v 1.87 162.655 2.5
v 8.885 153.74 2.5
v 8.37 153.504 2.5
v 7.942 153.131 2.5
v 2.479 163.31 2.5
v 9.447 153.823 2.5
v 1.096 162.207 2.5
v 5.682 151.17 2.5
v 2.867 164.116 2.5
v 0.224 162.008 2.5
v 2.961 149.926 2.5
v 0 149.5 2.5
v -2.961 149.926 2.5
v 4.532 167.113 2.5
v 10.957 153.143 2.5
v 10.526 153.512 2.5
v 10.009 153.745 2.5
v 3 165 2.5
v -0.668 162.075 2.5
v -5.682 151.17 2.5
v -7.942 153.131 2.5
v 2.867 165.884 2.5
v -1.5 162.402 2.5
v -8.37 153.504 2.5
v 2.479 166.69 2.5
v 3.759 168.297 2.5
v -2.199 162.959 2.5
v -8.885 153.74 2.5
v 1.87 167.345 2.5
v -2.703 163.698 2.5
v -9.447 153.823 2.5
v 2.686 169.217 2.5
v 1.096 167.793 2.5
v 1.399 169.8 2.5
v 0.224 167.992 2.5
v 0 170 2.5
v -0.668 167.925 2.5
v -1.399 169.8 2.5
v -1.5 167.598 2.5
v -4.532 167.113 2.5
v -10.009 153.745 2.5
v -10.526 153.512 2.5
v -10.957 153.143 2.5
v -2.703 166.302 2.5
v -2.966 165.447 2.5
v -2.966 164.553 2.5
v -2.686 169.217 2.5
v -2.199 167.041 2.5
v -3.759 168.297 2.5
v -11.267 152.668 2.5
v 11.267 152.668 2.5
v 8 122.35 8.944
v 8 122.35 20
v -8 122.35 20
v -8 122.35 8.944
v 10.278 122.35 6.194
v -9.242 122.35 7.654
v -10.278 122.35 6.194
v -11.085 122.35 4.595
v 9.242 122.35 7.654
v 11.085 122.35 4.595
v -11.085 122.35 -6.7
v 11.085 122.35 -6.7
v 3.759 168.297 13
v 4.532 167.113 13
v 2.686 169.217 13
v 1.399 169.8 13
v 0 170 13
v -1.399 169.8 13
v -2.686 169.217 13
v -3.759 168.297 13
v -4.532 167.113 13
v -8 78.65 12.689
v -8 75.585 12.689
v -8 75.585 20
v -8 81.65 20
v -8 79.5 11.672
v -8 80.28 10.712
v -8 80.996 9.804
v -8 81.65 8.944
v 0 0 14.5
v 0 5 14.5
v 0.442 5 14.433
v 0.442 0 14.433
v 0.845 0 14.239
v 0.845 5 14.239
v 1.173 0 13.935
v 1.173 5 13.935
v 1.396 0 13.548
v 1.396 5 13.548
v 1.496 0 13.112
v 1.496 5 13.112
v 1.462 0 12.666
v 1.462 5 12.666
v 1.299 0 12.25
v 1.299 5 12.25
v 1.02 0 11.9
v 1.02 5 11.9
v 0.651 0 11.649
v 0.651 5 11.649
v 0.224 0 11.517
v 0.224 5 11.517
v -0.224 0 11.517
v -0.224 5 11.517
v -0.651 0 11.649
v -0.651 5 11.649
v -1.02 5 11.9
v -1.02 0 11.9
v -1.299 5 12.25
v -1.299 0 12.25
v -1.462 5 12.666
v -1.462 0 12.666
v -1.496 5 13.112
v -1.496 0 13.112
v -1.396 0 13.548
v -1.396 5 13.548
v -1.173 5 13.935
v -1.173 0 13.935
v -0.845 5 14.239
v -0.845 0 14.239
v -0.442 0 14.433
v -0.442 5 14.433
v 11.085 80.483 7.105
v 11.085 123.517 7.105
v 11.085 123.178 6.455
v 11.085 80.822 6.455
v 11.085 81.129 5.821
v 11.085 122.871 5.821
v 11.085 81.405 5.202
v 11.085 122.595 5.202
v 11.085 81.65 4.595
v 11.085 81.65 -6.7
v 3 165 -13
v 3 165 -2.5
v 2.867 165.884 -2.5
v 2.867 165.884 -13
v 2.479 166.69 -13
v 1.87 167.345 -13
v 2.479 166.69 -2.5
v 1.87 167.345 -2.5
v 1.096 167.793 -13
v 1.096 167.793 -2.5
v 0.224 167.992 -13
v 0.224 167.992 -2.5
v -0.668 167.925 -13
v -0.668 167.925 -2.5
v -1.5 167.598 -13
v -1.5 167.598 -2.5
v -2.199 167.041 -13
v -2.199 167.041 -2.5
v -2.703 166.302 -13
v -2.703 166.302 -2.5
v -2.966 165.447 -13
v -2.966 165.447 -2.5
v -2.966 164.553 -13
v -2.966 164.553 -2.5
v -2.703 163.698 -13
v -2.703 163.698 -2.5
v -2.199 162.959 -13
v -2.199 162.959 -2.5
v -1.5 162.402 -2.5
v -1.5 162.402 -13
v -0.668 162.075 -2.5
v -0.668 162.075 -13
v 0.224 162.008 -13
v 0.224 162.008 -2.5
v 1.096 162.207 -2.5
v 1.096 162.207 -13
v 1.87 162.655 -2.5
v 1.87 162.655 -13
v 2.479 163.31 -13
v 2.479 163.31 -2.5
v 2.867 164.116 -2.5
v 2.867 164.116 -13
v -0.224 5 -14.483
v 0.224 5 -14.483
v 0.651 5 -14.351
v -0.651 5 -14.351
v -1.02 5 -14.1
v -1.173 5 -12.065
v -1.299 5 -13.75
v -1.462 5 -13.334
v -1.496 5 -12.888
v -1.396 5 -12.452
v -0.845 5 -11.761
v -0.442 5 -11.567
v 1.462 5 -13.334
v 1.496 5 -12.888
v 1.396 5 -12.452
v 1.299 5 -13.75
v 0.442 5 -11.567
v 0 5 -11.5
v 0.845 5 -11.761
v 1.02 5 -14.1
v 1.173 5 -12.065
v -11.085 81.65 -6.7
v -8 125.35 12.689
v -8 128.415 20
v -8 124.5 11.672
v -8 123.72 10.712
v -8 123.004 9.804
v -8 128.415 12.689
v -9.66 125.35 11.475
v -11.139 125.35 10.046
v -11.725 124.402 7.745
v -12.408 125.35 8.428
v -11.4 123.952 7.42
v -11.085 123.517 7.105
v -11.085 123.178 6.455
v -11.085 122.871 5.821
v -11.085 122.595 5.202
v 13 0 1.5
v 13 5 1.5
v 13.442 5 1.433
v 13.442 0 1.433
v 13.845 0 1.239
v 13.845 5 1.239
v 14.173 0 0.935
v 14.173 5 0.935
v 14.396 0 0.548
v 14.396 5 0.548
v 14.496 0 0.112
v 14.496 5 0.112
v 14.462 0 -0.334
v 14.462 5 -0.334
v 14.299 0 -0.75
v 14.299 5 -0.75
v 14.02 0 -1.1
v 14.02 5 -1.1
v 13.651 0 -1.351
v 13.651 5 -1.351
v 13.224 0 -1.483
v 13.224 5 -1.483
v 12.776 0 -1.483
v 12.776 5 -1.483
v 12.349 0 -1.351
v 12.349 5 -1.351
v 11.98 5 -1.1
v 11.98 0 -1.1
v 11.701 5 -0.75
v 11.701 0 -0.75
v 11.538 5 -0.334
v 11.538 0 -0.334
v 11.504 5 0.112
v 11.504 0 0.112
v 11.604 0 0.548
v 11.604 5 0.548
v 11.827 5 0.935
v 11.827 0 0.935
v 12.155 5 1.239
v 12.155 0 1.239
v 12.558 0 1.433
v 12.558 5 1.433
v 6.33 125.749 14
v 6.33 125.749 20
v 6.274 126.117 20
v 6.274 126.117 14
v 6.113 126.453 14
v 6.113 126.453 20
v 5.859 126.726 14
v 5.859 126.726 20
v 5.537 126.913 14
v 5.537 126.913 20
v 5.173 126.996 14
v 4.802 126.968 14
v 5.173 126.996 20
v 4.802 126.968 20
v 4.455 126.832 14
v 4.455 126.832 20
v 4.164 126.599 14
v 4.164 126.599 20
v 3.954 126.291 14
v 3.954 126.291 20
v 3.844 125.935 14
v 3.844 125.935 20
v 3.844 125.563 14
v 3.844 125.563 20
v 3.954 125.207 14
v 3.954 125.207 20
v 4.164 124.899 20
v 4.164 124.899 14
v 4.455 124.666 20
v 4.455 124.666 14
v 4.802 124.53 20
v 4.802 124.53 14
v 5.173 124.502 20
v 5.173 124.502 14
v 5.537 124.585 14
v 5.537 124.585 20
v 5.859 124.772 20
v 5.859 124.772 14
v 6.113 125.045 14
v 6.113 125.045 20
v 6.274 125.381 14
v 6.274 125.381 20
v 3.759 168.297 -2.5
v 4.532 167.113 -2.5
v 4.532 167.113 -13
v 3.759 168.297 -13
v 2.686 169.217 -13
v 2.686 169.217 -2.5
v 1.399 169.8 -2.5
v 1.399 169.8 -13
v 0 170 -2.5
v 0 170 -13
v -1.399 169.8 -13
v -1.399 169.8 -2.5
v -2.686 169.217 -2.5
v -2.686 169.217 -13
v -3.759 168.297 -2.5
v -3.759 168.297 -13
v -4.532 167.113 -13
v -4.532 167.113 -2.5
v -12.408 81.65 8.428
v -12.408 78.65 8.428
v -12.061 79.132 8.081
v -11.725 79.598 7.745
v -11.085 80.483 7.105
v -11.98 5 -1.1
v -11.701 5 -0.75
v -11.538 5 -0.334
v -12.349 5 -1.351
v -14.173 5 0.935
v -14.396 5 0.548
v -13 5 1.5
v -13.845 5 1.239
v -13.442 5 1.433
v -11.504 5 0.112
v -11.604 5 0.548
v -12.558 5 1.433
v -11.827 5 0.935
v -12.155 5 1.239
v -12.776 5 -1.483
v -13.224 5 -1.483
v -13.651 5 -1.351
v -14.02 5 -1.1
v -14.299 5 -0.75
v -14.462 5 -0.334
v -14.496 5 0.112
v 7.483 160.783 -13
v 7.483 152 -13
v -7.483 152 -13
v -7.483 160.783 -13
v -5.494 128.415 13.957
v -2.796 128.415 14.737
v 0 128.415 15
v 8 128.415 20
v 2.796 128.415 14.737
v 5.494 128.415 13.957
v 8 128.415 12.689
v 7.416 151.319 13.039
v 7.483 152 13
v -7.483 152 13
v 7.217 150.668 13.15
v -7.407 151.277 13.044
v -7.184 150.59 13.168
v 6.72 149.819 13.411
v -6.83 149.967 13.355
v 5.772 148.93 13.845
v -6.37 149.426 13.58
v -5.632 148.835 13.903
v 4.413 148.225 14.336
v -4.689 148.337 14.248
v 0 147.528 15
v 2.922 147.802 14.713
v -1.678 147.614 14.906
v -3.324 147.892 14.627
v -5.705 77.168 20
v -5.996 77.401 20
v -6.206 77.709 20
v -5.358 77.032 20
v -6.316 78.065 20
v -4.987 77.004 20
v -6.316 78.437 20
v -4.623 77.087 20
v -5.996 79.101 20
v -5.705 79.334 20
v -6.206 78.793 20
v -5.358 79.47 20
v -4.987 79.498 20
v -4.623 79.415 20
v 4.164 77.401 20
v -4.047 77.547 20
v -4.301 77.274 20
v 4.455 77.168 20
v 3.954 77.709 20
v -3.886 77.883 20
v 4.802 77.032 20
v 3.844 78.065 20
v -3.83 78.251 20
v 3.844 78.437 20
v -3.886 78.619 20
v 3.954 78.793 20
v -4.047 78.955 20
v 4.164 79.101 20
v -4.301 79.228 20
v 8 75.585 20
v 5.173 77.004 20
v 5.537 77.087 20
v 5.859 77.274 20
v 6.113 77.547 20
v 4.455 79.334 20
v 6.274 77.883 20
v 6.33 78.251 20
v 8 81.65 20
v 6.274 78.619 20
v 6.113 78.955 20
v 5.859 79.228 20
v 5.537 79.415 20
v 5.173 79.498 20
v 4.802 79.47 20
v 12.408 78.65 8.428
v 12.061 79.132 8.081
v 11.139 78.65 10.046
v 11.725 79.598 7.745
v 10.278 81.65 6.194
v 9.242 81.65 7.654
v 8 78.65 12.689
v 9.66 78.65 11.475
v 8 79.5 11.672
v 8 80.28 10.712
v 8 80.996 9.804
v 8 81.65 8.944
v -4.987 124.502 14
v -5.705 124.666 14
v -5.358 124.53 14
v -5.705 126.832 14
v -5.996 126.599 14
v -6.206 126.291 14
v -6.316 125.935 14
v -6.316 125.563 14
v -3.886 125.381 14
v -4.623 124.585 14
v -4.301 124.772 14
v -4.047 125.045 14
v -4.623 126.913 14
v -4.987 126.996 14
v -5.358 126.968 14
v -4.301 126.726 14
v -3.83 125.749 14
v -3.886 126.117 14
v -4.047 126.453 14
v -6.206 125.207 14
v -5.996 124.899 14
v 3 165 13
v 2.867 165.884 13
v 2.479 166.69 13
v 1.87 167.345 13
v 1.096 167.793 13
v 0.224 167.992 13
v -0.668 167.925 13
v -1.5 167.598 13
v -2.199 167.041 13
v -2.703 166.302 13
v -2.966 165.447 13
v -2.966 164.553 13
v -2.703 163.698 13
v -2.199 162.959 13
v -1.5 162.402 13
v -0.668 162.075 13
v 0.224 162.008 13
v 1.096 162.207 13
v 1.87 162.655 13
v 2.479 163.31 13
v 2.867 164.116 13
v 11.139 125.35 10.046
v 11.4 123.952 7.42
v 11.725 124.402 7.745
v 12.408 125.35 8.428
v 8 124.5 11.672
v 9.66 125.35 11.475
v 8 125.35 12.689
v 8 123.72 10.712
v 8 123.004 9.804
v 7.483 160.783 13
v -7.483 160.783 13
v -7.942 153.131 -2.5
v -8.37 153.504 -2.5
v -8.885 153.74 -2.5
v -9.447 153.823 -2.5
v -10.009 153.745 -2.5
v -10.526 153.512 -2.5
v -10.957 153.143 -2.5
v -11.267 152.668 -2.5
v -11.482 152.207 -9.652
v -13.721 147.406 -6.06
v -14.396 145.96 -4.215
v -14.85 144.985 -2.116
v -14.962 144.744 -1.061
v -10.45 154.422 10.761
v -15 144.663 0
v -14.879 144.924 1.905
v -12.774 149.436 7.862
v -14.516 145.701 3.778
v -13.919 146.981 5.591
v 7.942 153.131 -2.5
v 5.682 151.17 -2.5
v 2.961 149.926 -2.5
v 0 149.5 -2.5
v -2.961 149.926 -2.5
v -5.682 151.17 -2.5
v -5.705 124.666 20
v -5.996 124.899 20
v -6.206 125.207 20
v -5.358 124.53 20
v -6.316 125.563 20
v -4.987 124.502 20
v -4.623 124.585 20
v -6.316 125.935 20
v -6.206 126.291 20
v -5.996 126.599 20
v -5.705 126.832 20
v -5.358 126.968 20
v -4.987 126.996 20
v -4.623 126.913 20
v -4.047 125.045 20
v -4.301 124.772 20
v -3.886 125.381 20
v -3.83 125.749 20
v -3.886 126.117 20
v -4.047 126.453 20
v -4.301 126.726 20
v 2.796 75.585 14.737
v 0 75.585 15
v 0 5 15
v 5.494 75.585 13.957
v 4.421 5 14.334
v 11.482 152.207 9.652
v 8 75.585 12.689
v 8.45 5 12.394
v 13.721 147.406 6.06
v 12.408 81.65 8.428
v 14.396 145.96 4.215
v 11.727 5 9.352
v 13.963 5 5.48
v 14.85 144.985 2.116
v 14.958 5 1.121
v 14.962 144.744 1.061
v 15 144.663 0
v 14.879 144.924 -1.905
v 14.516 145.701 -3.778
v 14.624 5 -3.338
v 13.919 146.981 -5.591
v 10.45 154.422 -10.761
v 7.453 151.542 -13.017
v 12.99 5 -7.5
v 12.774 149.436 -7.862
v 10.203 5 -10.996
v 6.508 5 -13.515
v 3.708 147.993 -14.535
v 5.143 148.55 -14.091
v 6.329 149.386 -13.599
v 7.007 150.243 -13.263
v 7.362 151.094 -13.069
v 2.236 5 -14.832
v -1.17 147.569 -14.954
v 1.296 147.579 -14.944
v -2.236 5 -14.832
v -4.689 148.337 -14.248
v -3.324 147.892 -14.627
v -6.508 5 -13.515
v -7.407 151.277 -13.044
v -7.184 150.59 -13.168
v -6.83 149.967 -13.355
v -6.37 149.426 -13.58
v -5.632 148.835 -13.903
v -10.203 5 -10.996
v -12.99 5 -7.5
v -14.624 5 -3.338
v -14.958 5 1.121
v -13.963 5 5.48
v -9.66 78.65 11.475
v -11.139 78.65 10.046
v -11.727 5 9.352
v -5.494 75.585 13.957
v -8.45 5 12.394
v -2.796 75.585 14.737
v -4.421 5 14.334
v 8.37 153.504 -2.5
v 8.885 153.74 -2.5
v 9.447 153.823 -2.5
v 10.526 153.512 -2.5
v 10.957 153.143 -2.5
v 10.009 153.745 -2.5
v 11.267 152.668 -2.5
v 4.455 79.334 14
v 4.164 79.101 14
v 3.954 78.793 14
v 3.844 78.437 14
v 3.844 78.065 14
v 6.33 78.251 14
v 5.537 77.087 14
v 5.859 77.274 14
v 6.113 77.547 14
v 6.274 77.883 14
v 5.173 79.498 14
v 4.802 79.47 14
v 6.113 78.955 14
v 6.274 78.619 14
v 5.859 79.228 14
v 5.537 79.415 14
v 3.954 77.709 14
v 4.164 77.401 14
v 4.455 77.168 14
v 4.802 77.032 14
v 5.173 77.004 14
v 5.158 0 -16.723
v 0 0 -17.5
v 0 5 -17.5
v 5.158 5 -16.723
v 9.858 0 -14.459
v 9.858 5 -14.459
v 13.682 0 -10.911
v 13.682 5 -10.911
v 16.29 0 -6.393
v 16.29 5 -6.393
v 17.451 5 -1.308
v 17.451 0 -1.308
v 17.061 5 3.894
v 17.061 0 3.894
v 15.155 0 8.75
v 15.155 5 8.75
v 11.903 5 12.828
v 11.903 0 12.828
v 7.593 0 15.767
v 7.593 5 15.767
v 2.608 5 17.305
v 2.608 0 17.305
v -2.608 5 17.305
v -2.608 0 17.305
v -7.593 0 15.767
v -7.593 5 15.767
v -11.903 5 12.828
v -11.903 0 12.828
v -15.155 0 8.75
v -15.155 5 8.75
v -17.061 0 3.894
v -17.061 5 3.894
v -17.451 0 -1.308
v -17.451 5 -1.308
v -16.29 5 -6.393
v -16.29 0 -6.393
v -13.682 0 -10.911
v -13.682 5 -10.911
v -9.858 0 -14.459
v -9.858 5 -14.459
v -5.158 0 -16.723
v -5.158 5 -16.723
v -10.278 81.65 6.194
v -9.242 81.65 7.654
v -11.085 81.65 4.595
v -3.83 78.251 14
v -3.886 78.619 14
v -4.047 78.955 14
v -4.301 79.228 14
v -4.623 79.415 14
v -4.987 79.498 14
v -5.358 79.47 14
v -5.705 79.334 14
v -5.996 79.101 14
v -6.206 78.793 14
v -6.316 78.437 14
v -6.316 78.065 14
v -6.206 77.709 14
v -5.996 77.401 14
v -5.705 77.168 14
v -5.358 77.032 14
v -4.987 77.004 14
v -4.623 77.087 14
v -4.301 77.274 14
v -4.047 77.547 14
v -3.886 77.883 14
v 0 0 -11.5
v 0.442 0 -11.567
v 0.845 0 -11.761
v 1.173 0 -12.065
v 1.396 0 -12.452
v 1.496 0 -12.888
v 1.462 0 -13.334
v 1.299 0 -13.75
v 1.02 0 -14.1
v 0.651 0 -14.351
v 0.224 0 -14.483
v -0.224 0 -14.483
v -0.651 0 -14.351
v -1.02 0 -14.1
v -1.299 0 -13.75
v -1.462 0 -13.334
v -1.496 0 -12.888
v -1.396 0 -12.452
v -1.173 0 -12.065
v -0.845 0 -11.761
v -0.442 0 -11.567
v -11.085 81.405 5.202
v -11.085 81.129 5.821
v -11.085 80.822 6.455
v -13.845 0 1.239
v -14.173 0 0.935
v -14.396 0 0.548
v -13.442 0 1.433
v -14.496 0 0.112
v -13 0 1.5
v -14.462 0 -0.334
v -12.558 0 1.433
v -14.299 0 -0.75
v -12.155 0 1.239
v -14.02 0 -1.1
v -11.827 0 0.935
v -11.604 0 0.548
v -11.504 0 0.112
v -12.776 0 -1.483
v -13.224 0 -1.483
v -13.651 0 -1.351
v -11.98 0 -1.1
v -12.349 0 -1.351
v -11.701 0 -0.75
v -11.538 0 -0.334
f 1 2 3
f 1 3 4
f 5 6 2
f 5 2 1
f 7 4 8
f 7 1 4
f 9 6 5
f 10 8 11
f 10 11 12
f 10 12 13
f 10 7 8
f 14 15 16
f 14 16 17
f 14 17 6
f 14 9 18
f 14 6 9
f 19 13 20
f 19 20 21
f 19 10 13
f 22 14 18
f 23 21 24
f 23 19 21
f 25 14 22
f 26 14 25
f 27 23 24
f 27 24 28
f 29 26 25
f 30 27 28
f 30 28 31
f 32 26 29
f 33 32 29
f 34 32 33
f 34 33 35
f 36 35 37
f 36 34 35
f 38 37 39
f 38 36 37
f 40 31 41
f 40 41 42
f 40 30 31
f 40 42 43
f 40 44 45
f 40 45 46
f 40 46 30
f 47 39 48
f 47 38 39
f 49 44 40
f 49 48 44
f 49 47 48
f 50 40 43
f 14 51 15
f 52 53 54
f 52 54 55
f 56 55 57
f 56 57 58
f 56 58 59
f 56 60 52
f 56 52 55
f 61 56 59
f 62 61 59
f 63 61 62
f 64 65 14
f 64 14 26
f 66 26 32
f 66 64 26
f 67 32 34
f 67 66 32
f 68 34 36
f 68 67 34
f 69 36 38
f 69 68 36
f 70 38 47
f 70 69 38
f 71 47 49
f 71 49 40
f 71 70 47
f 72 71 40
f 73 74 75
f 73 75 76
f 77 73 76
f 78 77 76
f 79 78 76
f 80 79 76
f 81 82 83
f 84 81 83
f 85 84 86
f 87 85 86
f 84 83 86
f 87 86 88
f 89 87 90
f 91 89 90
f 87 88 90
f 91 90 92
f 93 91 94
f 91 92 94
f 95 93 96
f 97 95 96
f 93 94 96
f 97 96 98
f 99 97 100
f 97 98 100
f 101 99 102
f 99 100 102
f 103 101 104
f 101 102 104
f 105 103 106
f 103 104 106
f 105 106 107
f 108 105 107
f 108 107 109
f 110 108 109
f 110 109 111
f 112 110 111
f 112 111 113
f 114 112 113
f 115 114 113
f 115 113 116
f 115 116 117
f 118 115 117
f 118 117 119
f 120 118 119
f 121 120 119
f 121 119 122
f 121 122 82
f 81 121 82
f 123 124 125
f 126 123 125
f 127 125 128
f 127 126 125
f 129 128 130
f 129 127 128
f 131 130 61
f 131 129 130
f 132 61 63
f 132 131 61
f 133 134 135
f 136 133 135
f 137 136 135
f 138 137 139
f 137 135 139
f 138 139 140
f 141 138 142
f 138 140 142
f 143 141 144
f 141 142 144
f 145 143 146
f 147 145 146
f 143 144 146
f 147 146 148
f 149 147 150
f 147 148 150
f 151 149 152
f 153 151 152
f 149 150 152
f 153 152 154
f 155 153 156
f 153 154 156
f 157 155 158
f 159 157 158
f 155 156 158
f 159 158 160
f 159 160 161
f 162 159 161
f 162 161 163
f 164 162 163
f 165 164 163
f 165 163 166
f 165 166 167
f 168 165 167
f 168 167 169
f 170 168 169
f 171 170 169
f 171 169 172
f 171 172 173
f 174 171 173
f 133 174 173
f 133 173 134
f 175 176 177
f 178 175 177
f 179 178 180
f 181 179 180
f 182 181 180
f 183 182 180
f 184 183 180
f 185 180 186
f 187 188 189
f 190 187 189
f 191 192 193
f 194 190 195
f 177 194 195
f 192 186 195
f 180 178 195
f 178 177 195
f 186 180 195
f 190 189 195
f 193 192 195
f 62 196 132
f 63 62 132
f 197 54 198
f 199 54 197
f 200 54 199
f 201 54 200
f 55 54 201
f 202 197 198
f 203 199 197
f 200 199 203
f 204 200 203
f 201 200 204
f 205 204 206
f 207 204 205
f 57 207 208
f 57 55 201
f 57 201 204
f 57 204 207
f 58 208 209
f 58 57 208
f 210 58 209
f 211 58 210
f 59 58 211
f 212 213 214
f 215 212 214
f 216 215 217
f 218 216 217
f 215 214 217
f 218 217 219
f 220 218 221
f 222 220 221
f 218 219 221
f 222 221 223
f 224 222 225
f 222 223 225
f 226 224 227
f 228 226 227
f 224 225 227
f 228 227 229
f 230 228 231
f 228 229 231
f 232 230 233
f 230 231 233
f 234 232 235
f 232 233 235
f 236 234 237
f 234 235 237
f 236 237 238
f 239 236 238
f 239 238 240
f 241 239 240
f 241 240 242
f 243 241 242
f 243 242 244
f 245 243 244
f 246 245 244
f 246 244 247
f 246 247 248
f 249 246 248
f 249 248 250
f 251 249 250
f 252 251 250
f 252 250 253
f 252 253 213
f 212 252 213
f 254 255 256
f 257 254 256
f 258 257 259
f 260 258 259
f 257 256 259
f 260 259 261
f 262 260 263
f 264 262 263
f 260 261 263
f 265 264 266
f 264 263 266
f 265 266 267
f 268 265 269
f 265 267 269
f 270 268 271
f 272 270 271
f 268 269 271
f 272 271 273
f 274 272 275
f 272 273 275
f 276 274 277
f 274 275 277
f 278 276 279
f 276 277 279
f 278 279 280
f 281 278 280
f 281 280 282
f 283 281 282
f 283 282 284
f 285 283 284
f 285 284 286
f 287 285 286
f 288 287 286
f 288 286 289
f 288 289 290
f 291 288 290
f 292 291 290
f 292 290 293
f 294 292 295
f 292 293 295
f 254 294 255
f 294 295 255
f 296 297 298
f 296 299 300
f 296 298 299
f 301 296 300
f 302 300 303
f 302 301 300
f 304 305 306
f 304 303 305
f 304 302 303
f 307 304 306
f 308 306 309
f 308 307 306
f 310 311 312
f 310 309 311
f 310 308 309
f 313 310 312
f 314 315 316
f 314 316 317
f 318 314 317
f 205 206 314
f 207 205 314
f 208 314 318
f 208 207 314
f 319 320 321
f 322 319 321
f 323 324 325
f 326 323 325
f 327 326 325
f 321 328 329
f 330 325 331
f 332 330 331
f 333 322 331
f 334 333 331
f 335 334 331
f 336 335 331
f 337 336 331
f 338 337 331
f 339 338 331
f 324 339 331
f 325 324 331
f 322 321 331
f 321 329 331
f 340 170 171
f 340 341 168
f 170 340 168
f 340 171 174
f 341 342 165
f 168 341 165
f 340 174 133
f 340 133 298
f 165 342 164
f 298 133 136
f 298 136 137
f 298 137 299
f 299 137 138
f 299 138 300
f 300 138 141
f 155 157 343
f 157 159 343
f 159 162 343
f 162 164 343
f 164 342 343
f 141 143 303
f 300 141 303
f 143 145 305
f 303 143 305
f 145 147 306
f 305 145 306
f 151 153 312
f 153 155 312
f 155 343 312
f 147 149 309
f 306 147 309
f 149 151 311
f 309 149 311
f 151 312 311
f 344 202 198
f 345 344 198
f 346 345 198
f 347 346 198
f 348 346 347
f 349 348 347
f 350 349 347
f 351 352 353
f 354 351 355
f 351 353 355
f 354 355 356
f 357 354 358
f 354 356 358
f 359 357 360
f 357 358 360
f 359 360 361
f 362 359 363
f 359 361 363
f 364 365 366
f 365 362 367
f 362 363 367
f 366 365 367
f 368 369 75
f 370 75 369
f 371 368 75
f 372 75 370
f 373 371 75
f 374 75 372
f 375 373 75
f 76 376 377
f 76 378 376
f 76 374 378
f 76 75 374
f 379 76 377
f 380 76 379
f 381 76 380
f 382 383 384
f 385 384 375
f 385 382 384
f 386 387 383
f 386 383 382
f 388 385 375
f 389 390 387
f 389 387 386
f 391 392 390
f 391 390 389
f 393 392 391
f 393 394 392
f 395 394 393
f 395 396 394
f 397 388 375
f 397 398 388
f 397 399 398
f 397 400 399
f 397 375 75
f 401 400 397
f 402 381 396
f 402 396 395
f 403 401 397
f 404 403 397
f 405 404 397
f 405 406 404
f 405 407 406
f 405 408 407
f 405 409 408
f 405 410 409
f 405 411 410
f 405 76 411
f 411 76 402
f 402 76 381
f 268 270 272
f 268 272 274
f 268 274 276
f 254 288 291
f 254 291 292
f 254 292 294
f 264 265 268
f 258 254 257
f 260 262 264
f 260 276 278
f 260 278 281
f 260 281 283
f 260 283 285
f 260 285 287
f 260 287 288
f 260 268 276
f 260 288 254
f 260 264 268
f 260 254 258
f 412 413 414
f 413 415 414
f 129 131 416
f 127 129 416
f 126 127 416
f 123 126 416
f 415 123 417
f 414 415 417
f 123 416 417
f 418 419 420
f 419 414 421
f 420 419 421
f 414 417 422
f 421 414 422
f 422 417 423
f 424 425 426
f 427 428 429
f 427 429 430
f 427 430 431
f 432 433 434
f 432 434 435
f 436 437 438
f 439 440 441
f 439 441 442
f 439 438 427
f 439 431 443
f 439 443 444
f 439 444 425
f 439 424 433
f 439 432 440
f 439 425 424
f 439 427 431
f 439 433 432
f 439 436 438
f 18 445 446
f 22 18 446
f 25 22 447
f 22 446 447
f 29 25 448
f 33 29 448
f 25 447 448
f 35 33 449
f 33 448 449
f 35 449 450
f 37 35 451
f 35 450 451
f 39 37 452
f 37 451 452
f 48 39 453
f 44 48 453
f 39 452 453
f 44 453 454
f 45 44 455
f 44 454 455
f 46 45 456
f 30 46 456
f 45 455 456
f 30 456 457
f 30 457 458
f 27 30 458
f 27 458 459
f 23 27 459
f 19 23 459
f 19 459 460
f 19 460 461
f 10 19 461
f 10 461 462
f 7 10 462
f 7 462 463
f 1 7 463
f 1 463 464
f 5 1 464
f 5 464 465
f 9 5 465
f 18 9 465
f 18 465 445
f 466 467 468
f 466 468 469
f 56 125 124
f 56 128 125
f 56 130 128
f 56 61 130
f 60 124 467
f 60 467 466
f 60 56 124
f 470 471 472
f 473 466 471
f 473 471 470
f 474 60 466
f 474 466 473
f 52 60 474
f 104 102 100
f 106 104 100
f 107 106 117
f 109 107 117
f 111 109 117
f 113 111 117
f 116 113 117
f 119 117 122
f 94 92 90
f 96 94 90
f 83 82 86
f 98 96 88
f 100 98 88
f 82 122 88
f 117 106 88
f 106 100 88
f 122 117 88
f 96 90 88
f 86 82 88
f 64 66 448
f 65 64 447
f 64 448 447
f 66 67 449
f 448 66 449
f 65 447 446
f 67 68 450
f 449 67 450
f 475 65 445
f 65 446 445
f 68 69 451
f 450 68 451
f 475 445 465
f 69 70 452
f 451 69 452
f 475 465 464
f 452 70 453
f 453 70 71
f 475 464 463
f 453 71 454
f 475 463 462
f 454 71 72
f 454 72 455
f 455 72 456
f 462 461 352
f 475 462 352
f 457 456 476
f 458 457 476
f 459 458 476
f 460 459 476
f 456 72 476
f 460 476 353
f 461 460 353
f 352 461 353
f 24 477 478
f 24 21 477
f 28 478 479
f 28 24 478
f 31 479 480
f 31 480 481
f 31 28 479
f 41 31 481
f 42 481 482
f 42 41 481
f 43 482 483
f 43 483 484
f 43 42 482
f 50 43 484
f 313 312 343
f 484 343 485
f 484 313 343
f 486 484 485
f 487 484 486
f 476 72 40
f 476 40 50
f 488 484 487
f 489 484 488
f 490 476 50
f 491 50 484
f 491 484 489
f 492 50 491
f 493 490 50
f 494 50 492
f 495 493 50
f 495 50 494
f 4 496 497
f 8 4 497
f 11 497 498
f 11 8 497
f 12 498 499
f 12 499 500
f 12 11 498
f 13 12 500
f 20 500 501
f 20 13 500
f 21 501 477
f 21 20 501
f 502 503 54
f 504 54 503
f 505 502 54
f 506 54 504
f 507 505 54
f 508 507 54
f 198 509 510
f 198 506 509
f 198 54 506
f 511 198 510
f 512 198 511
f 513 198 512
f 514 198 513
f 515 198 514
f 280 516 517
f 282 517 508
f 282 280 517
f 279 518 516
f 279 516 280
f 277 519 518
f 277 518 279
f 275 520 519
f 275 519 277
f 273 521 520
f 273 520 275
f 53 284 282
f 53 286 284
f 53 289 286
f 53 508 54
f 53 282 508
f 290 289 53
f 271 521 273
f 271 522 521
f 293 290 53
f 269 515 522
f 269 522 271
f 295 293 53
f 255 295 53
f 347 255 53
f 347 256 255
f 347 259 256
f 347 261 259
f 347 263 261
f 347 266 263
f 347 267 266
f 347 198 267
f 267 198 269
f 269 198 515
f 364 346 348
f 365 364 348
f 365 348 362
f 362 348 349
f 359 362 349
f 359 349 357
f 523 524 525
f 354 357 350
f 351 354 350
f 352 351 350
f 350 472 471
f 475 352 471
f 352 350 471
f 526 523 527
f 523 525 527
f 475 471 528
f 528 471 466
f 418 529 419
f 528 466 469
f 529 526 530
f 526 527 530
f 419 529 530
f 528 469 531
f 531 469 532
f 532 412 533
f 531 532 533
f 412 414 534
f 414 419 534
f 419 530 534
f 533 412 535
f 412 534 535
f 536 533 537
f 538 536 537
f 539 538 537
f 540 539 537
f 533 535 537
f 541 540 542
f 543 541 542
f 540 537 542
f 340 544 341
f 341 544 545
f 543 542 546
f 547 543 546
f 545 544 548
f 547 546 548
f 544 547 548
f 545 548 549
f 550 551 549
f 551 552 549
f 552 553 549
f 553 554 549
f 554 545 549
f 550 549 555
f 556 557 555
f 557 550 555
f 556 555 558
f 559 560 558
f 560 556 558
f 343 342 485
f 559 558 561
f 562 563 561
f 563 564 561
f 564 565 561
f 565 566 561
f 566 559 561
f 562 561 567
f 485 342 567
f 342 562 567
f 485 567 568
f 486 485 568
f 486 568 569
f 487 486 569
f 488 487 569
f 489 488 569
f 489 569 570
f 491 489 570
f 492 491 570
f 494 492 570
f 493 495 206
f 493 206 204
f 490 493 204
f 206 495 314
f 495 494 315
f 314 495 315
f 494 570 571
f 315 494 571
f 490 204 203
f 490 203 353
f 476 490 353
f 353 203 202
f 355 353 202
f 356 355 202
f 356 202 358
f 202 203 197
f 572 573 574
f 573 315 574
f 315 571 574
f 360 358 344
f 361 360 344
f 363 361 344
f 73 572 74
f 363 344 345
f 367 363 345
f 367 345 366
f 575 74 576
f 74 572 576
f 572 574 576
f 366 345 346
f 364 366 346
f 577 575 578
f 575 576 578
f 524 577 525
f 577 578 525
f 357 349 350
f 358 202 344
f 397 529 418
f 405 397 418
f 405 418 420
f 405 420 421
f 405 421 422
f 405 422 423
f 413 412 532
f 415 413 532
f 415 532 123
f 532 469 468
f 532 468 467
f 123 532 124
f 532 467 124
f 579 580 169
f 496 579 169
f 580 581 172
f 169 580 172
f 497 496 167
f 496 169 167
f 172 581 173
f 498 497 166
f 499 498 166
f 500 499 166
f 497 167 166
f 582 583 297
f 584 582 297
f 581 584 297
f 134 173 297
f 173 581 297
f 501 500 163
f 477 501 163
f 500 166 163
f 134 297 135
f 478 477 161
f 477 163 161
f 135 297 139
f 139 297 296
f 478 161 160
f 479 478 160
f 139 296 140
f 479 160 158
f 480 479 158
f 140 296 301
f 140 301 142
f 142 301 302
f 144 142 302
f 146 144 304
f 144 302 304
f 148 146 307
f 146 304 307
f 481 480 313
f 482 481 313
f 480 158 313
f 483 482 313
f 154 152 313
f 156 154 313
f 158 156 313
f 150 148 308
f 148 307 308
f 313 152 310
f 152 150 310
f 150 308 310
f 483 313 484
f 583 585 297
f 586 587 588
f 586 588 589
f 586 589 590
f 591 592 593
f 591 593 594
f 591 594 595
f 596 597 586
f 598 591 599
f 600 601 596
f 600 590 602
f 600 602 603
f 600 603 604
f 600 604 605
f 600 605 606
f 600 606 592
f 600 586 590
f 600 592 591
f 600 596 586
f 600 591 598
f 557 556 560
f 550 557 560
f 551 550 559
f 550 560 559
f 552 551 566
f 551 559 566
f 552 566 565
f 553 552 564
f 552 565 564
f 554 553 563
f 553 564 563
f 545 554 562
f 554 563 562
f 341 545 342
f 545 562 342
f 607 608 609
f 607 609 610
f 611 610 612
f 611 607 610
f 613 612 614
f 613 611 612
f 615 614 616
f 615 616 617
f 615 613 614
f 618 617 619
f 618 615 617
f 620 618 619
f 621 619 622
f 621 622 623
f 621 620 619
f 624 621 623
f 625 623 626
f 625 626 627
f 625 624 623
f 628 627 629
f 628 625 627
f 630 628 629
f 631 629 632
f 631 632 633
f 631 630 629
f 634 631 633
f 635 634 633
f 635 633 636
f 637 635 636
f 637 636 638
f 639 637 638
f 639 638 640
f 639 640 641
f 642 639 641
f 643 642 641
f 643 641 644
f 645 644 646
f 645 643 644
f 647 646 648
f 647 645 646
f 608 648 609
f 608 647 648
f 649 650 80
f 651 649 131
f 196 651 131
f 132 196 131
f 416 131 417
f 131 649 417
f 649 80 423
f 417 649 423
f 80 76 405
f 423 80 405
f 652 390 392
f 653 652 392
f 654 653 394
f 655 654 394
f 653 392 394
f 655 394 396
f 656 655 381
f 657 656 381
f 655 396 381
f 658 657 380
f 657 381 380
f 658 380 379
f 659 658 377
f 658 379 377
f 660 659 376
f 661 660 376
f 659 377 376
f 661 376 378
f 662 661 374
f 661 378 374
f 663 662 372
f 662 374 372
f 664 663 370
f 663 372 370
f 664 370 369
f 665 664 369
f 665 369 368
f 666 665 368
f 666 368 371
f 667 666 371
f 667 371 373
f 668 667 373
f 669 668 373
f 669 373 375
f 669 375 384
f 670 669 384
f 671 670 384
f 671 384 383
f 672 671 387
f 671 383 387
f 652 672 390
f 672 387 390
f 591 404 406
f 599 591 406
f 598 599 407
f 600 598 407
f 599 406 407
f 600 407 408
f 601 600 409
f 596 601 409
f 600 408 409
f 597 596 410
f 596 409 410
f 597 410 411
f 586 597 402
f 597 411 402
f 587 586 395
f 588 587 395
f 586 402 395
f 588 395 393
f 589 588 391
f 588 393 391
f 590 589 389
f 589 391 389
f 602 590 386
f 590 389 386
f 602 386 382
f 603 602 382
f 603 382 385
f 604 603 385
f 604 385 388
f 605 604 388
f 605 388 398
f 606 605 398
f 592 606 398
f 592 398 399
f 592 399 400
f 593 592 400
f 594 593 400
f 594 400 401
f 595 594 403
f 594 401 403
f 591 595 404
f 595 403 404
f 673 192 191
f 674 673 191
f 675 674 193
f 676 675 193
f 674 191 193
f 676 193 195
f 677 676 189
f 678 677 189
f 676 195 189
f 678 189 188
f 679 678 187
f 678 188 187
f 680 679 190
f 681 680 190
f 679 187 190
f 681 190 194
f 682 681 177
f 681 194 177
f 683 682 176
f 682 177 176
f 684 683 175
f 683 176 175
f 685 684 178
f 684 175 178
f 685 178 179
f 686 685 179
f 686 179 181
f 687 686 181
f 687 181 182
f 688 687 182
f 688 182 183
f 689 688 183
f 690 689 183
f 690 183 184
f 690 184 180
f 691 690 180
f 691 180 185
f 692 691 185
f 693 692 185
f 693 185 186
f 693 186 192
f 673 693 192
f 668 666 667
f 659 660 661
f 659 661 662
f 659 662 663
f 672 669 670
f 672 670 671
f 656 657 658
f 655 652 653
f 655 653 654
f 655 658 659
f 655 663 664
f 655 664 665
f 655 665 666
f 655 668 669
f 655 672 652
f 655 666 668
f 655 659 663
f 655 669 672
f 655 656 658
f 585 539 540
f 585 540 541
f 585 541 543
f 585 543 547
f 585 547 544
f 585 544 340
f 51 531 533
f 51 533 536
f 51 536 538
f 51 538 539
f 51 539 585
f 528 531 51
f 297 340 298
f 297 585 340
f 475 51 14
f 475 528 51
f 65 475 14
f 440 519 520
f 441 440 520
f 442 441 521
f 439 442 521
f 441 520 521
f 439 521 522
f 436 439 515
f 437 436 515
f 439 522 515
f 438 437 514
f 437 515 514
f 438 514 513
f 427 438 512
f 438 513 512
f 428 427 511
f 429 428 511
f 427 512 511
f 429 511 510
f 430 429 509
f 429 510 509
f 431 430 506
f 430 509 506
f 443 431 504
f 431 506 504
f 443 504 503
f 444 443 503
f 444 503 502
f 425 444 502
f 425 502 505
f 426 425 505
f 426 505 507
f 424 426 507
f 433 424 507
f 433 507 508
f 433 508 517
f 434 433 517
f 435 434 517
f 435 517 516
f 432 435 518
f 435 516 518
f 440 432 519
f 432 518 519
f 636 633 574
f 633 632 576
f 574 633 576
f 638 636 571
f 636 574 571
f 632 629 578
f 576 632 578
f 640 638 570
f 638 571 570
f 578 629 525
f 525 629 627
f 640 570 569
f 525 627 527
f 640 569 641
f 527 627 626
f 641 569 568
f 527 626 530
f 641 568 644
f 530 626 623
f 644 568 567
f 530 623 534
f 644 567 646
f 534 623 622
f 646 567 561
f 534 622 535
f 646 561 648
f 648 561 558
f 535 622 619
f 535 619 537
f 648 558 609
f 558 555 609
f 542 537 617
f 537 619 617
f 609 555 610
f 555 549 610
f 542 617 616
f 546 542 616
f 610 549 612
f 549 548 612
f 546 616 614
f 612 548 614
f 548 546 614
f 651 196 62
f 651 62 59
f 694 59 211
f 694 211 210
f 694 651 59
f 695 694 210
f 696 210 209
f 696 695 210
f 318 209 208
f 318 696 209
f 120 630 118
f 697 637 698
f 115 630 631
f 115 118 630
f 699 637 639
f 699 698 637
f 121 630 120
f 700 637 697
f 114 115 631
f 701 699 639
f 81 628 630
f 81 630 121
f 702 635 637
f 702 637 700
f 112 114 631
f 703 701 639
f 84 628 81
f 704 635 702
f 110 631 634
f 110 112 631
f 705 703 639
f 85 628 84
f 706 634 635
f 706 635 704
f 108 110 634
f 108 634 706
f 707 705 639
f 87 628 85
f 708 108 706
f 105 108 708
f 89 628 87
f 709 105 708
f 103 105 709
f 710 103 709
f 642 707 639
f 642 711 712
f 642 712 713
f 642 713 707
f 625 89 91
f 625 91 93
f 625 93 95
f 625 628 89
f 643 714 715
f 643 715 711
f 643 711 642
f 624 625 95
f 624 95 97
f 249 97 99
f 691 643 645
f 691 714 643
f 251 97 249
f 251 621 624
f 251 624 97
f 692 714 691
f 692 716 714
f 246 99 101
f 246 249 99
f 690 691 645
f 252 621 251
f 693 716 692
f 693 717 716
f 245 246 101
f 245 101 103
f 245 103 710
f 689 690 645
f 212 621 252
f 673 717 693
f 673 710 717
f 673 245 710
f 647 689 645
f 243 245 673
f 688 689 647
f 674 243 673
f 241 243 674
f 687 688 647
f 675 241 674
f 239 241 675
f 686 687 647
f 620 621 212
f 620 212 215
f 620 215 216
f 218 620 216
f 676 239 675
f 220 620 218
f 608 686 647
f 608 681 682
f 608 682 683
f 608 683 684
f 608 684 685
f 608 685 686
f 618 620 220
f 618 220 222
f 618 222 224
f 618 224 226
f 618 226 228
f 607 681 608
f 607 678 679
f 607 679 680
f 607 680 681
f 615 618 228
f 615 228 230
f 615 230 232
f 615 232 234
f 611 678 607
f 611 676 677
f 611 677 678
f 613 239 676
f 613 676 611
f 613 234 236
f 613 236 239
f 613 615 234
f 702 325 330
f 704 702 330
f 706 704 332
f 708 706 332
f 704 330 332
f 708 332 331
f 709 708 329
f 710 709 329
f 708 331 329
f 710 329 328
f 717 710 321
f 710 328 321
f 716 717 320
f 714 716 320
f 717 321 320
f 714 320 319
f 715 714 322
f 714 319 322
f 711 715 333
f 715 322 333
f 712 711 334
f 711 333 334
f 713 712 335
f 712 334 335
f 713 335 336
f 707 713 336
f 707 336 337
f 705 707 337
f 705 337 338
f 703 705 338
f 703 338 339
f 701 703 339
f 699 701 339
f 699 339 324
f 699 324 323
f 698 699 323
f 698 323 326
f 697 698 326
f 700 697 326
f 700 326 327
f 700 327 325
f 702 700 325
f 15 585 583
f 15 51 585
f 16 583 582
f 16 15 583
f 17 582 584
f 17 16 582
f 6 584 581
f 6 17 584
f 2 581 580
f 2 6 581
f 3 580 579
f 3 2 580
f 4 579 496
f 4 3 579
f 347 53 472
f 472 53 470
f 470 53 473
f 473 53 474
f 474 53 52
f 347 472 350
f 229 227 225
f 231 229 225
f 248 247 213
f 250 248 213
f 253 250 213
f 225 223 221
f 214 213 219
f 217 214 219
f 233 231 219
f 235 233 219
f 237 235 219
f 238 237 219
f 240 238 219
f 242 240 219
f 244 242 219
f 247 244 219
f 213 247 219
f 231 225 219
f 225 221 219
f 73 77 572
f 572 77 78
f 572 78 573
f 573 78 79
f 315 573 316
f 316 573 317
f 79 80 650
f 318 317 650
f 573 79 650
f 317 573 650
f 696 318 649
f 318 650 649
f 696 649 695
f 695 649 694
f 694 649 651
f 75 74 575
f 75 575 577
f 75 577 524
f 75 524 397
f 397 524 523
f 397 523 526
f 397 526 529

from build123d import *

# Parameters (mm, degrees)
SKETCH1_R               = 15
BOSS_EXTRUDE1_DEPTH     = 170
CUT_EXTRUDE1_DEPTH      = 2.5
CUT_EXTRUDE2_DEPTH      = 172.31841699
CUT_EXTRUDE2_DEPTH_BACK = 172.31841699
SKETCH4_R               = 3
CUT_EXTRUDE3_DEPTH      = 173.942186995
CUT_EXTRUDE4_DEPTH      = 173.942186995
FILLET1_R               = 2
SKETCH6_W               = 16
SKETCH6_H               = 52.83
BOSS_EXTRUDE2_DEPTH     = 20
SKETCH7_W               = 22.170562286
SKETCH7_H               = 40.7
CUT_EXTRUDE5_DEPTH      = 26.7
SKETCH8_R               = 1.25
CUT_EXTRUDE6_DEPTH      = 6
SKETCH9_R               = 17.5
BOSS_EXTRUDE3_DEPTH     = 5
SKETCH10_R              = 1.5
CUT_EXTRUDE7_DEPTH      = 168.126449134
CHAMFER1_SIZE           = 3


with BuildPart() as part:
    # Sketch1 → Boss-Extrude1 (new body)
    with BuildSketch(Plane(origin=(0, 0, 0), x_dir=(1, 0, 0), z_dir=(0, 1, 0))):
        with Locations(Location((0, 0, 0), (0, 0, 270))):
            Circle(SKETCH1_R)
    extrude(amount=BOSS_EXTRUDE1_DEPTH)

    # Sketch2 → Cut-Extrude1 (cut, symmetric)
    with BuildSketch(Plane.XY):
        with BuildLine():
            Line((-10.5, 160), (-10.5, 182.220649026))
            Line((-10.5, 182.220649026), (10.5, 182.220649026))
            Line((10.5, 182.220649026), (10.5, 160))
            ThreePointArc((10.5, 160), (0, 149.5), (-10.5, 160))
        make_face()
    extrude(amount=CUT_EXTRUDE1_DEPTH, both=True, mode=Mode.SUBTRACT)

    # Sketch3 → Cut-Extrude2 (cut, two sides: drawn at the far end of the back side and taken through both)
    with BuildSketch(Plane(origin=(0, 0, 0), x_dir=(0, 0, -1), z_dir=(1, 0, 0)).offset(-CUT_EXTRUDE2_DEPTH_BACK)):
        with BuildLine():
            Line((-15, 170), (-13, 170))
            Line((-13, 170), (-13, 152))
            ThreePointArc((-13, 152), (-13.522774425, 149.550510257), (-15, 147.527864045))
            Line((-15, 147.527864045), (-15, 170))
        make_face()
        with BuildLine():
            Line((15, 170), (15, 147.527864045))
            ThreePointArc((15, 147.527864045), (13.522774425, 149.550510257), (13, 152))
            Line((13, 152), (13, 170))
            Line((13, 170), (15, 170))
        make_face()
    extrude(amount=CUT_EXTRUDE2_DEPTH + CUT_EXTRUDE2_DEPTH_BACK, mode=Mode.SUBTRACT)

    # Sketch4 → Cut-Extrude3 (cut, through all)
    with BuildSketch(Plane.XY.offset(13)):
        with Locations((0, 165)):
            Circle(SKETCH4_R)
    extrude(amount=-CUT_EXTRUDE3_DEPTH, mode=Mode.SUBTRACT)

    # Sketch5 → Cut-Extrude4 (cut, through all)
    with BuildSketch(Plane.XY.offset(13)):
        with BuildLine():
            Line((-4.531538935, 167.113091309), (-15, 144.663404108))
            Line((-15, 144.663404108), (-15, 175.276470842))
            Line((-15, 175.276470842), (15, 175.276470842))
            Line((15, 175.276470842), (15, 144.663404108))
            Line((15, 144.663404108), (4.531538935, 167.113091309))
            ThreePointArc((4.531538935, 167.113091309), (0, 170), (-4.531538935, 167.113091309))
        make_face()
    extrude(amount=-CUT_EXTRUDE4_DEPTH, mode=Mode.SUBTRACT)

    # Fillet1
    fillet1_edges = [part.edges().sort_by_distance(p)[0] for p in [
        (-9.710782673, 156.00616727, 0),
        (9.710782673, 156.00616727, 0),
    ]]
    fillet(fillet1_edges, radius=FILLET1_R)

    # Sketch6 → Boss-Extrude2 (add)
    with BuildSketch(Plane.XY):
        with Locations((0, 102)):
            Rectangle(SKETCH6_W, SKETCH6_H)
    extrude(amount=BOSS_EXTRUDE2_DEPTH)

    # Sketch7 → Cut-Extrude5 (cut)
    with BuildSketch(Plane.XY.offset(20)):
        with Locations((0, 102)):
            Rectangle(SKETCH7_W, SKETCH7_H)
    extrude(amount=-CUT_EXTRUDE5_DEPTH, mode=Mode.SUBTRACT)

    # Sketch8 → Cut-Extrude6 (cut)
    with BuildSketch(Plane.XY.offset(20)):
        with Locations((-5.08, 125.749)):
            Circle(SKETCH8_R)
        with Locations((-5.08, 78.251)):
            Circle(SKETCH8_R)
        with Locations((5.08, 125.749)):
            Circle(SKETCH8_R)
        with Locations((5.08, 78.251)):
            Circle(SKETCH8_R)
    extrude(amount=-CUT_EXTRUDE6_DEPTH, mode=Mode.SUBTRACT)

    # Sketch9 → Boss-Extrude3 (add)
    with BuildSketch(Plane.XZ):
        with Locations(Location((0, 0, 0), (0, 0, 270))):
            Circle(SKETCH9_R)
    extrude(amount=-BOSS_EXTRUDE3_DEPTH)

    # Sketch10 → Cut-Extrude7 (cut, through all)
    with BuildSketch(Plane(origin=(0, 5, 0), x_dir=(1, 0, 0), z_dir=(0, 1, 0))):
        with Locations(Location((0, 13, 0), (0, 0, 270))):
            Circle(SKETCH10_R)
        with Locations(Location((13, 0, 0), (0, 0, 270))):
            Circle(SKETCH10_R)
        with Locations(Location((0, -13, 0), (0, 0, 270))):
            Circle(SKETCH10_R)
        with Locations(Location((-13, 0, 0), (0, 0, 270))):
            Circle(SKETCH10_R)
    extrude(amount=-CUT_EXTRUDE7_DEPTH, mode=Mode.SUBTRACT)

    # Chamfer1
    # the kernel refuses this chamfer: 3, 2.123587696 mm, written as the material it takes off along each edge
    with BuildSketch(Plane(origin=(11.085281143, 122.35, 10.105272978), x_dir=(0.6193558356899025, 0, -0.785110405482479), z_dir=(0, -1, 0))) as chamfer1_piece_1:
        with BuildLine():
            Line((2.136042798, 0), (CHAMFER1_SIZE * 0.785110405482, -CHAMFER1_SIZE * 0.61935583569))
            Line((CHAMFER1_SIZE * 0.785110405482, -CHAMFER1_SIZE * 0.61935583569), (0, 0))
            ThreePointArc((0, 0), (1.060999102, 0.038068992), (2.136042798, 0))
        make_face()
    extrude(amount=40.7, mode=Mode.SUBTRACT)
    with BuildSketch(Plane(origin=(-11.085281143, 122.35, 10.105272978), x_dir=(-0.6193558356899055, 0, -0.7851104054824767), z_dir=(0, -1, 0))) as chamfer1_piece_2:
        with BuildLine():
            Line((2.136042798, 0), (CHAMFER1_SIZE * 0.785110405482, CHAMFER1_SIZE * 0.61935583569))
            Line((CHAMFER1_SIZE * 0.785110405482, CHAMFER1_SIZE * 0.61935583569), (0, 0))
            ThreePointArc((0, 0), (1.060999102, -0.038068992), (2.136042798, 0))
        make_face()
    extrude(amount=40.7, mode=Mode.SUBTRACT)
    with BuildSketch(Plane(origin=(0, 81.65, 0), x_dir=(0.9748295624413148, 0, 0.22295139423308089), z_dir=(0.22295139423308089, 0, -0.9748295624413148))) as chamfer1_piece_3_section:
        Polygon((15, CHAMFER1_SIZE), (15 - CHAMFER1_SIZE, 0), (15, 0), align=None)
    chamfer1_piece_3 = revolve(axis=Axis((0, 81.65, 0), (0, -1, 0)), revolution_arc=74.356268972, mode=Mode.PRIVATE)
    chamfer1_piece_3 = split(chamfer1_piece_3, bisect_by=Plane(origin=(8, 81.65, 0), z_dir=(1, 0, 0)), keep=Keep.TOP, mode=Mode.PRIVATE)
    chamfer1_piece_3 = split(chamfer1_piece_3, bisect_by=Plane(origin=(11.085281143, 81.65, 0), z_dir=(-1, 0, 0)), keep=Keep.TOP, mode=Mode.PRIVATE)
    add(chamfer1_piece_3, mode=Mode.SUBTRACT)
    with BuildSketch(Plane(origin=(0, 81.65, 0), x_dir=(-0.04817493211174053, 0, 0.9988389138975459), z_dir=(0.9988389138975459, 0, 0.04817493211174053))) as chamfer1_piece_4_section:
        Polygon((15, CHAMFER1_SIZE), (15 - CHAMFER1_SIZE, 0), (15, 0), align=None)
    chamfer1_piece_4 = revolve(axis=Axis((0, 81.65, 0), (0, -1, 0)), revolution_arc=74.356268972, mode=Mode.PRIVATE)
    chamfer1_piece_4 = split(chamfer1_piece_4, bisect_by=Plane(origin=(-8, 81.65, 0), z_dir=(-1, 0, 0)), keep=Keep.TOP, mode=Mode.PRIVATE)
    chamfer1_piece_4 = split(chamfer1_piece_4, bisect_by=Plane(origin=(-11.085281143, 81.65, 0), z_dir=(1, 0, 0)), keep=Keep.TOP, mode=Mode.PRIVATE)
    add(chamfer1_piece_4, mode=Mode.SUBTRACT)
    with BuildSketch(Plane(origin=(0, 122.35, 0), x_dir=(0.9748295624413144, 0, 0.22295139423308263), z_dir=(0.22295139423308263, 0, -0.9748295624413144))) as chamfer1_piece_5_section:
        Polygon((15, -CHAMFER1_SIZE), (15 - CHAMFER1_SIZE, 0), (15, 0), align=None)
    chamfer1_piece_5 = revolve(axis=Axis((0, 122.35, 0), (0, -1, 0)), revolution_arc=74.356268972, mode=Mode.PRIVATE)
    chamfer1_piece_5 = split(chamfer1_piece_5, bisect_by=Plane(origin=(8, 122.35, 0), z_dir=(1, 0, 0)), keep=Keep.TOP, mode=Mode.PRIVATE)
    chamfer1_piece_5 = split(chamfer1_piece_5, bisect_by=Plane(origin=(11.085281143, 122.35, 0), z_dir=(-1, 0, 0)), keep=Keep.TOP, mode=Mode.PRIVATE)
    add(chamfer1_piece_5, mode=Mode.SUBTRACT)
    with BuildSketch(Plane(origin=(0, 122.35, 0), x_dir=(-0.04817493211174064, 0, 0.9988389138975459), z_dir=(0.9988389138975459, 0, 0.04817493211174064))) as chamfer1_piece_6_section:
        Polygon((15, -CHAMFER1_SIZE), (15 - CHAMFER1_SIZE, 0), (15, 0), align=None)
    chamfer1_piece_6 = revolve(axis=Axis((0, 122.35, 0), (0, -1, 0)), revolution_arc=74.356268972, mode=Mode.PRIVATE)
    chamfer1_piece_6 = split(chamfer1_piece_6, bisect_by=Plane(origin=(-8, 122.35, 0), z_dir=(-1, 0, 0)), keep=Keep.TOP, mode=Mode.PRIVATE)
    chamfer1_piece_6 = split(chamfer1_piece_6, bisect_by=Plane(origin=(-11.085281143, 122.35, 0), z_dir=(1, 0, 0)), keep=Keep.TOP, mode=Mode.PRIVATE)
    add(chamfer1_piece_6, mode=Mode.SUBTRACT)
    with BuildSketch(Plane(origin=(0, 122.35, 0), x_dir=(0.9748295624413144, 0, 0.22295139423308263), z_dir=(0.22295139423308263, 0, -0.9748295624413144))) as chamfer1_piece_7a_section:
        Polygon((15, -CHAMFER1_SIZE), (15 - CHAMFER1_SIZE, 0), (15, 0), align=None)
    chamfer1_piece_7a = revolve(axis=Axis((0, 122.35, 0), (0, -1, 0)), revolution_arc=74.356268972, mode=Mode.PRIVATE)
    chamfer1_piece_7a = split(chamfer1_piece_7a, bisect_by=Plane(origin=(11.085281143, 122.35, 0), z_dir=(1, 0, 0)), keep=Keep.TOP, mode=Mode.PRIVATE)
    with BuildSketch(Plane(origin=(11.085281143, 130.065048964, 10.105272978), x_dir=(0.6193558356899025, 0, -0.785110405482479), z_dir=(0, -1, 0))) as chamfer1_piece_7b_section:
        with BuildLine():
            Line((2.136042798, 0), (CHAMFER1_SIZE * 0.785110405482, -CHAMFER1_SIZE * 0.61935583569))
            Line((CHAMFER1_SIZE * 0.785110405482, -CHAMFER1_SIZE * 0.61935583569), (0, 0))
            ThreePointArc((0, 0), (1.060999102, 0.038068992), (2.136042798, 0))
        make_face()
    chamfer1_piece_7b = extrude(amount=48.415048964, mode=Mode.PRIVATE)
    chamfer1_piece_7b = split(chamfer1_piece_7b, bisect_by=Plane(origin=(11.085281143, 122.35, 10.105272978), z_dir=(0, 1, 0)), keep=Keep.TOP, mode=Mode.PRIVATE)
    chamfer1_piece_7 = chamfer1_piece_7a & chamfer1_piece_7b
    add(chamfer1_piece_7, mode=Mode.SUBTRACT)
    with BuildSketch(Plane(origin=(11.085281143, 122.35, 10.105272978), x_dir=(0.6193558356899025, 0, -0.785110405482479), z_dir=(0, -1, 0))) as chamfer1_piece_8a_section:
        with BuildLine():
            Line((2.136042798, 0), (CHAMFER1_SIZE * 0.785110405482, -CHAMFER1_SIZE * 0.61935583569))
            Line((CHAMFER1_SIZE * 0.785110405482, -CHAMFER1_SIZE * 0.61935583569), (0, 0))
            ThreePointArc((0, 0), (1.060999102, 0.038068992), (2.136042798, 0))
        make_face()
    chamfer1_piece_8a = extrude(amount=48.415048964, mode=Mode.PRIVATE)
    chamfer1_piece_8a = split(chamfer1_piece_8a, bisect_by=Plane(origin=(11.085281143, 81.65, 10.105272978), z_dir=(0, -1, 0)), keep=Keep.TOP, mode=Mode.PRIVATE)
    with BuildSketch(Plane(origin=(0, 81.65, 0), x_dir=(0.9748295624413148, 0, 0.22295139423308089), z_dir=(0.22295139423308089, 0, -0.9748295624413148))) as chamfer1_piece_8b_section:
        Polygon((15, CHAMFER1_SIZE), (15 - CHAMFER1_SIZE, 0), (15, 0), align=None)
    chamfer1_piece_8b = revolve(axis=Axis((0, 81.65, 0), (0, -1, 0)), revolution_arc=74.356268972, mode=Mode.PRIVATE)
    chamfer1_piece_8b = split(chamfer1_piece_8b, bisect_by=Plane(origin=(11.085281143, 81.65, 0), z_dir=(1, 0, 0)), keep=Keep.TOP, mode=Mode.PRIVATE)
    chamfer1_piece_8 = chamfer1_piece_8a & chamfer1_piece_8b
    add(chamfer1_piece_8, mode=Mode.SUBTRACT)
    with BuildSketch(Plane(origin=(-11.085281143, 130.065048964, 10.105272978), x_dir=(-0.6193558356899055, 0, -0.7851104054824767), z_dir=(0, -1, 0))) as chamfer1_piece_9a_section:
        with BuildLine():
            Line((2.136042798, 0), (CHAMFER1_SIZE * 0.785110405482, CHAMFER1_SIZE * 0.61935583569))
            Line((CHAMFER1_SIZE * 0.785110405482, CHAMFER1_SIZE * 0.61935583569), (0, 0))
            ThreePointArc((0, 0), (1.060999102, -0.038068992), (2.136042798, 0))
        make_face()
    chamfer1_piece_9a = extrude(amount=48.415048964, mode=Mode.PRIVATE)
    chamfer1_piece_9a = split(chamfer1_piece_9a, bisect_by=Plane(origin=(-11.085281143, 122.35, 10.105272978), z_dir=(0, 1, 0)), keep=Keep.TOP, mode=Mode.PRIVATE)
    with BuildSketch(Plane(origin=(0, 122.35, 0), x_dir=(-0.04817493211174064, 0, 0.9988389138975459), z_dir=(0.9988389138975459, 0, 0.04817493211174064))) as chamfer1_piece_9b_section:
        Polygon((15, -CHAMFER1_SIZE), (15 - CHAMFER1_SIZE, 0), (15, 0), align=None)
    chamfer1_piece_9b = revolve(axis=Axis((0, 122.35, 0), (0, -1, 0)), revolution_arc=74.356268972, mode=Mode.PRIVATE)
    chamfer1_piece_9b = split(chamfer1_piece_9b, bisect_by=Plane(origin=(-11.085281143, 122.35, 0), z_dir=(-1, 0, 0)), keep=Keep.TOP, mode=Mode.PRIVATE)
    chamfer1_piece_9 = chamfer1_piece_9a & chamfer1_piece_9b
    add(chamfer1_piece_9, mode=Mode.SUBTRACT)
    with BuildSketch(Plane(origin=(0, 81.65, 0), x_dir=(-0.04817493211174053, 0, 0.9988389138975459), z_dir=(0.9988389138975459, 0, 0.04817493211174053))) as chamfer1_piece_10a_section:
        Polygon((15, CHAMFER1_SIZE), (15 - CHAMFER1_SIZE, 0), (15, 0), align=None)
    chamfer1_piece_10a = revolve(axis=Axis((0, 81.65, 0), (0, -1, 0)), revolution_arc=74.356268972, mode=Mode.PRIVATE)
    chamfer1_piece_10a = split(chamfer1_piece_10a, bisect_by=Plane(origin=(-11.085281143, 81.65, 0), z_dir=(-1, 0, 0)), keep=Keep.TOP, mode=Mode.PRIVATE)
    with BuildSketch(Plane(origin=(-11.085281143, 122.35, 10.105272978), x_dir=(-0.6193558356899055, 0, -0.7851104054824767), z_dir=(0, -1, 0))) as chamfer1_piece_10b_section:
        with BuildLine():
            Line((2.136042798, 0), (CHAMFER1_SIZE * 0.785110405482, CHAMFER1_SIZE * 0.61935583569))
            Line((CHAMFER1_SIZE * 0.785110405482, CHAMFER1_SIZE * 0.61935583569), (0, 0))
            ThreePointArc((0, 0), (1.060999102, -0.038068992), (2.136042798, 0))
        make_face()
    chamfer1_piece_10b = extrude(amount=48.415048964, mode=Mode.PRIVATE)
    chamfer1_piece_10b = split(chamfer1_piece_10b, bisect_by=Plane(origin=(-11.085281143, 81.65, 10.105272978), z_dir=(0, -1, 0)), keep=Keep.TOP, mode=Mode.PRIVATE)
    chamfer1_piece_10 = chamfer1_piece_10a & chamfer1_piece_10b
    add(chamfer1_piece_10, mode=Mode.SUBTRACT)


solid = part.part
